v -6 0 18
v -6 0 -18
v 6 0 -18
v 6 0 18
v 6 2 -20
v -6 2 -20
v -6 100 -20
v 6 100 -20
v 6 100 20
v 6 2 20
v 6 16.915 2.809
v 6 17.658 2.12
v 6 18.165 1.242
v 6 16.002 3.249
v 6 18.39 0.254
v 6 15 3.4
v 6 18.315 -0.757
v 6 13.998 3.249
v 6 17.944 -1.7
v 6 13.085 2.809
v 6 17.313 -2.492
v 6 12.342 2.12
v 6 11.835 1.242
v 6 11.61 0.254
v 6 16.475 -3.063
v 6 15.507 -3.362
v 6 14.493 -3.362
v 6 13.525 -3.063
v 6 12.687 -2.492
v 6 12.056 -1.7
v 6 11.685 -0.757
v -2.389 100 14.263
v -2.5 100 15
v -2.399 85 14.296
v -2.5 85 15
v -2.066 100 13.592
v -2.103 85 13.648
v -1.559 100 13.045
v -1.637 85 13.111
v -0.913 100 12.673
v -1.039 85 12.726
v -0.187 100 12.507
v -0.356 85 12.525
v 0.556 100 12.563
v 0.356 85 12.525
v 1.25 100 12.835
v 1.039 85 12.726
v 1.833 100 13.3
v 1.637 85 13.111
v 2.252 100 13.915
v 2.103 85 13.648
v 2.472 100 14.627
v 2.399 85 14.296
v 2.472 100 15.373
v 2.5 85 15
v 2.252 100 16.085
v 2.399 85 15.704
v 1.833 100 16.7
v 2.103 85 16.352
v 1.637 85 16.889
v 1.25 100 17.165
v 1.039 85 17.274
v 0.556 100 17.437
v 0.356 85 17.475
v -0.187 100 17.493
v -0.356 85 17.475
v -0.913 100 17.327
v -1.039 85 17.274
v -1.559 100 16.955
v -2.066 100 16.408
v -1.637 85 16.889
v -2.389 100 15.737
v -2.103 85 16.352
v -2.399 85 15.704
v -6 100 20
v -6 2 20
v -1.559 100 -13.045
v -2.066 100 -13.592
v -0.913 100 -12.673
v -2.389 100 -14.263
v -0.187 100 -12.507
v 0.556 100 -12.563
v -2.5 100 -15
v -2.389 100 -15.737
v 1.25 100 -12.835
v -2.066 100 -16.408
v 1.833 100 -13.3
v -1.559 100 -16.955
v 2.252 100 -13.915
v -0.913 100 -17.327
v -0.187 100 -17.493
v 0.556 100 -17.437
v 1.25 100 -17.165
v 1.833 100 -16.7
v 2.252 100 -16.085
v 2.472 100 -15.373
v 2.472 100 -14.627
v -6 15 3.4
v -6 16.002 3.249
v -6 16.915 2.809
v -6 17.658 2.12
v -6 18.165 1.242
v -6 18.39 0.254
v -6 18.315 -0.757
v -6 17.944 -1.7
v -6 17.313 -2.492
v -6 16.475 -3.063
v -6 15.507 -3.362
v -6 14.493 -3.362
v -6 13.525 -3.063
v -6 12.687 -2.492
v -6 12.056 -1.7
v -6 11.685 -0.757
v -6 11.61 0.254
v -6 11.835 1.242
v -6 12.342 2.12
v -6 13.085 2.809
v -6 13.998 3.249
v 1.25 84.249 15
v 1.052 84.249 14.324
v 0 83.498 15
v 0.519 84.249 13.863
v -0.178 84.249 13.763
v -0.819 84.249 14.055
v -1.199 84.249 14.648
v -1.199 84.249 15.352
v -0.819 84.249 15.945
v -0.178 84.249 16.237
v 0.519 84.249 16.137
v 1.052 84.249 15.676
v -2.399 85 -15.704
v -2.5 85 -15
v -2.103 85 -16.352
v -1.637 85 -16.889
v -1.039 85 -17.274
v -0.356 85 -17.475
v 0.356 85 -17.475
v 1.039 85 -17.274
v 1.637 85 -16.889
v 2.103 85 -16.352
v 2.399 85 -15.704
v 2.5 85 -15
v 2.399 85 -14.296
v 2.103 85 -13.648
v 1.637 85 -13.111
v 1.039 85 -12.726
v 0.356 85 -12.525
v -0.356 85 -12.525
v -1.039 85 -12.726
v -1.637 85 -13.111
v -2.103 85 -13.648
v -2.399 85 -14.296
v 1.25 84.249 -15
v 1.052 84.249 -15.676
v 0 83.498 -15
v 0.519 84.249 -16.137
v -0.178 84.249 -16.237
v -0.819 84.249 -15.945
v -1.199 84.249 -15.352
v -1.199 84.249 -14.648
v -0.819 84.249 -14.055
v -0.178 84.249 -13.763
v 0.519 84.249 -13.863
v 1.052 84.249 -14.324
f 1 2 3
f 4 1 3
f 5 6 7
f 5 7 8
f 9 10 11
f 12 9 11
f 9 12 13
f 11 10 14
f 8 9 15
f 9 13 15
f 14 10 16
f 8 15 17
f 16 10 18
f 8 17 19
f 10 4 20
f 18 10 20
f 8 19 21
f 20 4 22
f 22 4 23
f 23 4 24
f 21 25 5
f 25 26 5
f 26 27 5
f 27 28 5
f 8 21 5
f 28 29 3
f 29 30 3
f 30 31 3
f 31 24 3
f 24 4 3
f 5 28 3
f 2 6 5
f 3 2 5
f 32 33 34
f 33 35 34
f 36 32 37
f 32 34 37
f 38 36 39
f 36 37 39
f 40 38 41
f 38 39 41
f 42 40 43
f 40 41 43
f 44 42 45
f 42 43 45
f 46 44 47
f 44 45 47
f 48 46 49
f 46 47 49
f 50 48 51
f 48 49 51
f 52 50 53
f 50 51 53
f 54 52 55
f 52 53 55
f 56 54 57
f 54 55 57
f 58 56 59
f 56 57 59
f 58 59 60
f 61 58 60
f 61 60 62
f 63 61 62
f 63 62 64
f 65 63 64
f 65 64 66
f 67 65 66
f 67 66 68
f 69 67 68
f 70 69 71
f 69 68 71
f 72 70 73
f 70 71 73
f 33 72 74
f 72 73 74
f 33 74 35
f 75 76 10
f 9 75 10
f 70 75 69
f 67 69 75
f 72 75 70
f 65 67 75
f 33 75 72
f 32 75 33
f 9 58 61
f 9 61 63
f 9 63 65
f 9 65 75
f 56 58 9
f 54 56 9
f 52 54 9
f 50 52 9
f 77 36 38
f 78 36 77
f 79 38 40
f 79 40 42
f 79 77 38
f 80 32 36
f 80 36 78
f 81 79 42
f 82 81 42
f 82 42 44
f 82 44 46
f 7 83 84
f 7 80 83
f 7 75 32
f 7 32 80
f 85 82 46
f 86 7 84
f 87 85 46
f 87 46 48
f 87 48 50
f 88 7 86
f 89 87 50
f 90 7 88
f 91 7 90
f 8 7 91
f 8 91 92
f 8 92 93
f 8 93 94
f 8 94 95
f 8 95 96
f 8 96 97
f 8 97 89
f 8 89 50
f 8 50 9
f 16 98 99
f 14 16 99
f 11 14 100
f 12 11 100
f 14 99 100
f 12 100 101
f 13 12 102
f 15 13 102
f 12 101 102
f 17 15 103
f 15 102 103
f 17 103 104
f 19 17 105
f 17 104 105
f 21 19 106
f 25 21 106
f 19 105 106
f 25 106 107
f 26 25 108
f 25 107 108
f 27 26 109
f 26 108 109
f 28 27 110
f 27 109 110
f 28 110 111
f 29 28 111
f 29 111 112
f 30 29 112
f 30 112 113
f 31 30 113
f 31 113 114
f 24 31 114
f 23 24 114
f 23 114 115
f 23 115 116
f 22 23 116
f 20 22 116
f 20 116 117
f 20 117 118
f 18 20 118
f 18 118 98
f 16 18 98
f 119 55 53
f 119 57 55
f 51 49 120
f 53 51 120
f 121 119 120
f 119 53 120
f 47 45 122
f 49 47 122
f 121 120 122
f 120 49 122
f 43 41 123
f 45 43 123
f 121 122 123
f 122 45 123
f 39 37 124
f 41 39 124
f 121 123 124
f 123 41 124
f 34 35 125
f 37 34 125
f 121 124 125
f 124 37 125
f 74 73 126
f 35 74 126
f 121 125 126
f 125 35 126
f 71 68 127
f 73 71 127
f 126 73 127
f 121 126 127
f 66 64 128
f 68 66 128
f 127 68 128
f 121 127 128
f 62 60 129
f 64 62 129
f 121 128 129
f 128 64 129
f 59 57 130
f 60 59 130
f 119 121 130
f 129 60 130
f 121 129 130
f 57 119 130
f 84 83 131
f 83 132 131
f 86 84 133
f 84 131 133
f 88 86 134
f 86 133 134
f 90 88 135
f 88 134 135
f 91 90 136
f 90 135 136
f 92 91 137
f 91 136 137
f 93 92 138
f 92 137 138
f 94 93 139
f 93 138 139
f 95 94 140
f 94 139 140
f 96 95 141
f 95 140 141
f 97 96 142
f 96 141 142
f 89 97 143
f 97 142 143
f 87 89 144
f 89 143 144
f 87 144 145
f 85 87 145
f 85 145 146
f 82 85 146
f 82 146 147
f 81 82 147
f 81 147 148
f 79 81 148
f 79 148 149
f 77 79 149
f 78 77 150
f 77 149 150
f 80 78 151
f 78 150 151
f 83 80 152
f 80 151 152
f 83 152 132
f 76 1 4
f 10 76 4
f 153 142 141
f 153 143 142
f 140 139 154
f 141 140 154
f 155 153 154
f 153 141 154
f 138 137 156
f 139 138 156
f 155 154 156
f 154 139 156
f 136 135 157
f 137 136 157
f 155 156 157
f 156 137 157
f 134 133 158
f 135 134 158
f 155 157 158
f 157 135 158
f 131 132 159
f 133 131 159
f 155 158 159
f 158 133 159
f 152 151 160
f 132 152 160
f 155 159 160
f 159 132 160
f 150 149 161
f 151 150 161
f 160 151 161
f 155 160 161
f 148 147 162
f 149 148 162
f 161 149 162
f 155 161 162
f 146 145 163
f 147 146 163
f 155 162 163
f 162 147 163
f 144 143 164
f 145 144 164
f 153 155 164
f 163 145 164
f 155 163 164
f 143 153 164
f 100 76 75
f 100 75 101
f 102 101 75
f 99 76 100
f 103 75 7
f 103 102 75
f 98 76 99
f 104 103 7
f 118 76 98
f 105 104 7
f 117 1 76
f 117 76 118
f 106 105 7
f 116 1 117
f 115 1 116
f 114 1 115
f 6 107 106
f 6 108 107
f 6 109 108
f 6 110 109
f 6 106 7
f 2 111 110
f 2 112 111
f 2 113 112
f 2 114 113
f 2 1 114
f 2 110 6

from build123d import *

# Parameters (mm, degrees)
SKETCH_1_W             = 12
SKETCH_1_H             = 40
EXTRUDE_1_DEPTH        = 100
HOLE_WIZARD_M6_1_D     = 5
HOLE_WIZARD_M6_1_DEPTH = 15
HOLE_WIZARD_M6_1_TIP   = 1.502151548
HOLE_WIZARD_M8_1_D     = 6.8
CHAMFER_1_SIZE         = 2


with BuildPart() as part:
    # 草图1 → 凸台-拉伸1 (new body)
    with BuildSketch(Plane(origin=(0, 0, 0), x_dir=(1, 0, 0), z_dir=(0, 1, 0))):
        Rectangle(SKETCH_1_W, SKETCH_1_H)
    extrude(amount=EXTRUDE_1_DEPTH)

    # M6 螺纹孔1
    with Locations(Plane(origin=(0, 100, 0), x_dir=(1, 0, 0), z_dir=(0, 1, 0))):
        with Locations((0, 15), (0, -15)):
            Hole(HOLE_WIZARD_M6_1_D / 2, depth=HOLE_WIZARD_M6_1_DEPTH)
            with Locations((0, 0, -(HOLE_WIZARD_M6_1_DEPTH + HOLE_WIZARD_M6_1_TIP / 2))):  # 118° drill point
                Cone(0, HOLE_WIZARD_M6_1_D / 2, HOLE_WIZARD_M6_1_TIP, mode=Mode.SUBTRACT)

    # M8 螺纹孔1 (through all)
    with Locations(Plane(origin=(6, 0, 0), x_dir=(0, 0, -1), z_dir=(1, 0, 0))):
        with Locations((0, 15)):
            Hole(HOLE_WIZARD_M8_1_D / 2)

    # 倒角1
    chamfer_1_edges = [part.edges().sort_by_distance(p)[0] for p in [
        (0, 0, 20),
        (0, 0, -20),
    ]]
    chamfer(chamfer_1_edges, length=CHAMFER_1_SIZE)


solid = part.part
